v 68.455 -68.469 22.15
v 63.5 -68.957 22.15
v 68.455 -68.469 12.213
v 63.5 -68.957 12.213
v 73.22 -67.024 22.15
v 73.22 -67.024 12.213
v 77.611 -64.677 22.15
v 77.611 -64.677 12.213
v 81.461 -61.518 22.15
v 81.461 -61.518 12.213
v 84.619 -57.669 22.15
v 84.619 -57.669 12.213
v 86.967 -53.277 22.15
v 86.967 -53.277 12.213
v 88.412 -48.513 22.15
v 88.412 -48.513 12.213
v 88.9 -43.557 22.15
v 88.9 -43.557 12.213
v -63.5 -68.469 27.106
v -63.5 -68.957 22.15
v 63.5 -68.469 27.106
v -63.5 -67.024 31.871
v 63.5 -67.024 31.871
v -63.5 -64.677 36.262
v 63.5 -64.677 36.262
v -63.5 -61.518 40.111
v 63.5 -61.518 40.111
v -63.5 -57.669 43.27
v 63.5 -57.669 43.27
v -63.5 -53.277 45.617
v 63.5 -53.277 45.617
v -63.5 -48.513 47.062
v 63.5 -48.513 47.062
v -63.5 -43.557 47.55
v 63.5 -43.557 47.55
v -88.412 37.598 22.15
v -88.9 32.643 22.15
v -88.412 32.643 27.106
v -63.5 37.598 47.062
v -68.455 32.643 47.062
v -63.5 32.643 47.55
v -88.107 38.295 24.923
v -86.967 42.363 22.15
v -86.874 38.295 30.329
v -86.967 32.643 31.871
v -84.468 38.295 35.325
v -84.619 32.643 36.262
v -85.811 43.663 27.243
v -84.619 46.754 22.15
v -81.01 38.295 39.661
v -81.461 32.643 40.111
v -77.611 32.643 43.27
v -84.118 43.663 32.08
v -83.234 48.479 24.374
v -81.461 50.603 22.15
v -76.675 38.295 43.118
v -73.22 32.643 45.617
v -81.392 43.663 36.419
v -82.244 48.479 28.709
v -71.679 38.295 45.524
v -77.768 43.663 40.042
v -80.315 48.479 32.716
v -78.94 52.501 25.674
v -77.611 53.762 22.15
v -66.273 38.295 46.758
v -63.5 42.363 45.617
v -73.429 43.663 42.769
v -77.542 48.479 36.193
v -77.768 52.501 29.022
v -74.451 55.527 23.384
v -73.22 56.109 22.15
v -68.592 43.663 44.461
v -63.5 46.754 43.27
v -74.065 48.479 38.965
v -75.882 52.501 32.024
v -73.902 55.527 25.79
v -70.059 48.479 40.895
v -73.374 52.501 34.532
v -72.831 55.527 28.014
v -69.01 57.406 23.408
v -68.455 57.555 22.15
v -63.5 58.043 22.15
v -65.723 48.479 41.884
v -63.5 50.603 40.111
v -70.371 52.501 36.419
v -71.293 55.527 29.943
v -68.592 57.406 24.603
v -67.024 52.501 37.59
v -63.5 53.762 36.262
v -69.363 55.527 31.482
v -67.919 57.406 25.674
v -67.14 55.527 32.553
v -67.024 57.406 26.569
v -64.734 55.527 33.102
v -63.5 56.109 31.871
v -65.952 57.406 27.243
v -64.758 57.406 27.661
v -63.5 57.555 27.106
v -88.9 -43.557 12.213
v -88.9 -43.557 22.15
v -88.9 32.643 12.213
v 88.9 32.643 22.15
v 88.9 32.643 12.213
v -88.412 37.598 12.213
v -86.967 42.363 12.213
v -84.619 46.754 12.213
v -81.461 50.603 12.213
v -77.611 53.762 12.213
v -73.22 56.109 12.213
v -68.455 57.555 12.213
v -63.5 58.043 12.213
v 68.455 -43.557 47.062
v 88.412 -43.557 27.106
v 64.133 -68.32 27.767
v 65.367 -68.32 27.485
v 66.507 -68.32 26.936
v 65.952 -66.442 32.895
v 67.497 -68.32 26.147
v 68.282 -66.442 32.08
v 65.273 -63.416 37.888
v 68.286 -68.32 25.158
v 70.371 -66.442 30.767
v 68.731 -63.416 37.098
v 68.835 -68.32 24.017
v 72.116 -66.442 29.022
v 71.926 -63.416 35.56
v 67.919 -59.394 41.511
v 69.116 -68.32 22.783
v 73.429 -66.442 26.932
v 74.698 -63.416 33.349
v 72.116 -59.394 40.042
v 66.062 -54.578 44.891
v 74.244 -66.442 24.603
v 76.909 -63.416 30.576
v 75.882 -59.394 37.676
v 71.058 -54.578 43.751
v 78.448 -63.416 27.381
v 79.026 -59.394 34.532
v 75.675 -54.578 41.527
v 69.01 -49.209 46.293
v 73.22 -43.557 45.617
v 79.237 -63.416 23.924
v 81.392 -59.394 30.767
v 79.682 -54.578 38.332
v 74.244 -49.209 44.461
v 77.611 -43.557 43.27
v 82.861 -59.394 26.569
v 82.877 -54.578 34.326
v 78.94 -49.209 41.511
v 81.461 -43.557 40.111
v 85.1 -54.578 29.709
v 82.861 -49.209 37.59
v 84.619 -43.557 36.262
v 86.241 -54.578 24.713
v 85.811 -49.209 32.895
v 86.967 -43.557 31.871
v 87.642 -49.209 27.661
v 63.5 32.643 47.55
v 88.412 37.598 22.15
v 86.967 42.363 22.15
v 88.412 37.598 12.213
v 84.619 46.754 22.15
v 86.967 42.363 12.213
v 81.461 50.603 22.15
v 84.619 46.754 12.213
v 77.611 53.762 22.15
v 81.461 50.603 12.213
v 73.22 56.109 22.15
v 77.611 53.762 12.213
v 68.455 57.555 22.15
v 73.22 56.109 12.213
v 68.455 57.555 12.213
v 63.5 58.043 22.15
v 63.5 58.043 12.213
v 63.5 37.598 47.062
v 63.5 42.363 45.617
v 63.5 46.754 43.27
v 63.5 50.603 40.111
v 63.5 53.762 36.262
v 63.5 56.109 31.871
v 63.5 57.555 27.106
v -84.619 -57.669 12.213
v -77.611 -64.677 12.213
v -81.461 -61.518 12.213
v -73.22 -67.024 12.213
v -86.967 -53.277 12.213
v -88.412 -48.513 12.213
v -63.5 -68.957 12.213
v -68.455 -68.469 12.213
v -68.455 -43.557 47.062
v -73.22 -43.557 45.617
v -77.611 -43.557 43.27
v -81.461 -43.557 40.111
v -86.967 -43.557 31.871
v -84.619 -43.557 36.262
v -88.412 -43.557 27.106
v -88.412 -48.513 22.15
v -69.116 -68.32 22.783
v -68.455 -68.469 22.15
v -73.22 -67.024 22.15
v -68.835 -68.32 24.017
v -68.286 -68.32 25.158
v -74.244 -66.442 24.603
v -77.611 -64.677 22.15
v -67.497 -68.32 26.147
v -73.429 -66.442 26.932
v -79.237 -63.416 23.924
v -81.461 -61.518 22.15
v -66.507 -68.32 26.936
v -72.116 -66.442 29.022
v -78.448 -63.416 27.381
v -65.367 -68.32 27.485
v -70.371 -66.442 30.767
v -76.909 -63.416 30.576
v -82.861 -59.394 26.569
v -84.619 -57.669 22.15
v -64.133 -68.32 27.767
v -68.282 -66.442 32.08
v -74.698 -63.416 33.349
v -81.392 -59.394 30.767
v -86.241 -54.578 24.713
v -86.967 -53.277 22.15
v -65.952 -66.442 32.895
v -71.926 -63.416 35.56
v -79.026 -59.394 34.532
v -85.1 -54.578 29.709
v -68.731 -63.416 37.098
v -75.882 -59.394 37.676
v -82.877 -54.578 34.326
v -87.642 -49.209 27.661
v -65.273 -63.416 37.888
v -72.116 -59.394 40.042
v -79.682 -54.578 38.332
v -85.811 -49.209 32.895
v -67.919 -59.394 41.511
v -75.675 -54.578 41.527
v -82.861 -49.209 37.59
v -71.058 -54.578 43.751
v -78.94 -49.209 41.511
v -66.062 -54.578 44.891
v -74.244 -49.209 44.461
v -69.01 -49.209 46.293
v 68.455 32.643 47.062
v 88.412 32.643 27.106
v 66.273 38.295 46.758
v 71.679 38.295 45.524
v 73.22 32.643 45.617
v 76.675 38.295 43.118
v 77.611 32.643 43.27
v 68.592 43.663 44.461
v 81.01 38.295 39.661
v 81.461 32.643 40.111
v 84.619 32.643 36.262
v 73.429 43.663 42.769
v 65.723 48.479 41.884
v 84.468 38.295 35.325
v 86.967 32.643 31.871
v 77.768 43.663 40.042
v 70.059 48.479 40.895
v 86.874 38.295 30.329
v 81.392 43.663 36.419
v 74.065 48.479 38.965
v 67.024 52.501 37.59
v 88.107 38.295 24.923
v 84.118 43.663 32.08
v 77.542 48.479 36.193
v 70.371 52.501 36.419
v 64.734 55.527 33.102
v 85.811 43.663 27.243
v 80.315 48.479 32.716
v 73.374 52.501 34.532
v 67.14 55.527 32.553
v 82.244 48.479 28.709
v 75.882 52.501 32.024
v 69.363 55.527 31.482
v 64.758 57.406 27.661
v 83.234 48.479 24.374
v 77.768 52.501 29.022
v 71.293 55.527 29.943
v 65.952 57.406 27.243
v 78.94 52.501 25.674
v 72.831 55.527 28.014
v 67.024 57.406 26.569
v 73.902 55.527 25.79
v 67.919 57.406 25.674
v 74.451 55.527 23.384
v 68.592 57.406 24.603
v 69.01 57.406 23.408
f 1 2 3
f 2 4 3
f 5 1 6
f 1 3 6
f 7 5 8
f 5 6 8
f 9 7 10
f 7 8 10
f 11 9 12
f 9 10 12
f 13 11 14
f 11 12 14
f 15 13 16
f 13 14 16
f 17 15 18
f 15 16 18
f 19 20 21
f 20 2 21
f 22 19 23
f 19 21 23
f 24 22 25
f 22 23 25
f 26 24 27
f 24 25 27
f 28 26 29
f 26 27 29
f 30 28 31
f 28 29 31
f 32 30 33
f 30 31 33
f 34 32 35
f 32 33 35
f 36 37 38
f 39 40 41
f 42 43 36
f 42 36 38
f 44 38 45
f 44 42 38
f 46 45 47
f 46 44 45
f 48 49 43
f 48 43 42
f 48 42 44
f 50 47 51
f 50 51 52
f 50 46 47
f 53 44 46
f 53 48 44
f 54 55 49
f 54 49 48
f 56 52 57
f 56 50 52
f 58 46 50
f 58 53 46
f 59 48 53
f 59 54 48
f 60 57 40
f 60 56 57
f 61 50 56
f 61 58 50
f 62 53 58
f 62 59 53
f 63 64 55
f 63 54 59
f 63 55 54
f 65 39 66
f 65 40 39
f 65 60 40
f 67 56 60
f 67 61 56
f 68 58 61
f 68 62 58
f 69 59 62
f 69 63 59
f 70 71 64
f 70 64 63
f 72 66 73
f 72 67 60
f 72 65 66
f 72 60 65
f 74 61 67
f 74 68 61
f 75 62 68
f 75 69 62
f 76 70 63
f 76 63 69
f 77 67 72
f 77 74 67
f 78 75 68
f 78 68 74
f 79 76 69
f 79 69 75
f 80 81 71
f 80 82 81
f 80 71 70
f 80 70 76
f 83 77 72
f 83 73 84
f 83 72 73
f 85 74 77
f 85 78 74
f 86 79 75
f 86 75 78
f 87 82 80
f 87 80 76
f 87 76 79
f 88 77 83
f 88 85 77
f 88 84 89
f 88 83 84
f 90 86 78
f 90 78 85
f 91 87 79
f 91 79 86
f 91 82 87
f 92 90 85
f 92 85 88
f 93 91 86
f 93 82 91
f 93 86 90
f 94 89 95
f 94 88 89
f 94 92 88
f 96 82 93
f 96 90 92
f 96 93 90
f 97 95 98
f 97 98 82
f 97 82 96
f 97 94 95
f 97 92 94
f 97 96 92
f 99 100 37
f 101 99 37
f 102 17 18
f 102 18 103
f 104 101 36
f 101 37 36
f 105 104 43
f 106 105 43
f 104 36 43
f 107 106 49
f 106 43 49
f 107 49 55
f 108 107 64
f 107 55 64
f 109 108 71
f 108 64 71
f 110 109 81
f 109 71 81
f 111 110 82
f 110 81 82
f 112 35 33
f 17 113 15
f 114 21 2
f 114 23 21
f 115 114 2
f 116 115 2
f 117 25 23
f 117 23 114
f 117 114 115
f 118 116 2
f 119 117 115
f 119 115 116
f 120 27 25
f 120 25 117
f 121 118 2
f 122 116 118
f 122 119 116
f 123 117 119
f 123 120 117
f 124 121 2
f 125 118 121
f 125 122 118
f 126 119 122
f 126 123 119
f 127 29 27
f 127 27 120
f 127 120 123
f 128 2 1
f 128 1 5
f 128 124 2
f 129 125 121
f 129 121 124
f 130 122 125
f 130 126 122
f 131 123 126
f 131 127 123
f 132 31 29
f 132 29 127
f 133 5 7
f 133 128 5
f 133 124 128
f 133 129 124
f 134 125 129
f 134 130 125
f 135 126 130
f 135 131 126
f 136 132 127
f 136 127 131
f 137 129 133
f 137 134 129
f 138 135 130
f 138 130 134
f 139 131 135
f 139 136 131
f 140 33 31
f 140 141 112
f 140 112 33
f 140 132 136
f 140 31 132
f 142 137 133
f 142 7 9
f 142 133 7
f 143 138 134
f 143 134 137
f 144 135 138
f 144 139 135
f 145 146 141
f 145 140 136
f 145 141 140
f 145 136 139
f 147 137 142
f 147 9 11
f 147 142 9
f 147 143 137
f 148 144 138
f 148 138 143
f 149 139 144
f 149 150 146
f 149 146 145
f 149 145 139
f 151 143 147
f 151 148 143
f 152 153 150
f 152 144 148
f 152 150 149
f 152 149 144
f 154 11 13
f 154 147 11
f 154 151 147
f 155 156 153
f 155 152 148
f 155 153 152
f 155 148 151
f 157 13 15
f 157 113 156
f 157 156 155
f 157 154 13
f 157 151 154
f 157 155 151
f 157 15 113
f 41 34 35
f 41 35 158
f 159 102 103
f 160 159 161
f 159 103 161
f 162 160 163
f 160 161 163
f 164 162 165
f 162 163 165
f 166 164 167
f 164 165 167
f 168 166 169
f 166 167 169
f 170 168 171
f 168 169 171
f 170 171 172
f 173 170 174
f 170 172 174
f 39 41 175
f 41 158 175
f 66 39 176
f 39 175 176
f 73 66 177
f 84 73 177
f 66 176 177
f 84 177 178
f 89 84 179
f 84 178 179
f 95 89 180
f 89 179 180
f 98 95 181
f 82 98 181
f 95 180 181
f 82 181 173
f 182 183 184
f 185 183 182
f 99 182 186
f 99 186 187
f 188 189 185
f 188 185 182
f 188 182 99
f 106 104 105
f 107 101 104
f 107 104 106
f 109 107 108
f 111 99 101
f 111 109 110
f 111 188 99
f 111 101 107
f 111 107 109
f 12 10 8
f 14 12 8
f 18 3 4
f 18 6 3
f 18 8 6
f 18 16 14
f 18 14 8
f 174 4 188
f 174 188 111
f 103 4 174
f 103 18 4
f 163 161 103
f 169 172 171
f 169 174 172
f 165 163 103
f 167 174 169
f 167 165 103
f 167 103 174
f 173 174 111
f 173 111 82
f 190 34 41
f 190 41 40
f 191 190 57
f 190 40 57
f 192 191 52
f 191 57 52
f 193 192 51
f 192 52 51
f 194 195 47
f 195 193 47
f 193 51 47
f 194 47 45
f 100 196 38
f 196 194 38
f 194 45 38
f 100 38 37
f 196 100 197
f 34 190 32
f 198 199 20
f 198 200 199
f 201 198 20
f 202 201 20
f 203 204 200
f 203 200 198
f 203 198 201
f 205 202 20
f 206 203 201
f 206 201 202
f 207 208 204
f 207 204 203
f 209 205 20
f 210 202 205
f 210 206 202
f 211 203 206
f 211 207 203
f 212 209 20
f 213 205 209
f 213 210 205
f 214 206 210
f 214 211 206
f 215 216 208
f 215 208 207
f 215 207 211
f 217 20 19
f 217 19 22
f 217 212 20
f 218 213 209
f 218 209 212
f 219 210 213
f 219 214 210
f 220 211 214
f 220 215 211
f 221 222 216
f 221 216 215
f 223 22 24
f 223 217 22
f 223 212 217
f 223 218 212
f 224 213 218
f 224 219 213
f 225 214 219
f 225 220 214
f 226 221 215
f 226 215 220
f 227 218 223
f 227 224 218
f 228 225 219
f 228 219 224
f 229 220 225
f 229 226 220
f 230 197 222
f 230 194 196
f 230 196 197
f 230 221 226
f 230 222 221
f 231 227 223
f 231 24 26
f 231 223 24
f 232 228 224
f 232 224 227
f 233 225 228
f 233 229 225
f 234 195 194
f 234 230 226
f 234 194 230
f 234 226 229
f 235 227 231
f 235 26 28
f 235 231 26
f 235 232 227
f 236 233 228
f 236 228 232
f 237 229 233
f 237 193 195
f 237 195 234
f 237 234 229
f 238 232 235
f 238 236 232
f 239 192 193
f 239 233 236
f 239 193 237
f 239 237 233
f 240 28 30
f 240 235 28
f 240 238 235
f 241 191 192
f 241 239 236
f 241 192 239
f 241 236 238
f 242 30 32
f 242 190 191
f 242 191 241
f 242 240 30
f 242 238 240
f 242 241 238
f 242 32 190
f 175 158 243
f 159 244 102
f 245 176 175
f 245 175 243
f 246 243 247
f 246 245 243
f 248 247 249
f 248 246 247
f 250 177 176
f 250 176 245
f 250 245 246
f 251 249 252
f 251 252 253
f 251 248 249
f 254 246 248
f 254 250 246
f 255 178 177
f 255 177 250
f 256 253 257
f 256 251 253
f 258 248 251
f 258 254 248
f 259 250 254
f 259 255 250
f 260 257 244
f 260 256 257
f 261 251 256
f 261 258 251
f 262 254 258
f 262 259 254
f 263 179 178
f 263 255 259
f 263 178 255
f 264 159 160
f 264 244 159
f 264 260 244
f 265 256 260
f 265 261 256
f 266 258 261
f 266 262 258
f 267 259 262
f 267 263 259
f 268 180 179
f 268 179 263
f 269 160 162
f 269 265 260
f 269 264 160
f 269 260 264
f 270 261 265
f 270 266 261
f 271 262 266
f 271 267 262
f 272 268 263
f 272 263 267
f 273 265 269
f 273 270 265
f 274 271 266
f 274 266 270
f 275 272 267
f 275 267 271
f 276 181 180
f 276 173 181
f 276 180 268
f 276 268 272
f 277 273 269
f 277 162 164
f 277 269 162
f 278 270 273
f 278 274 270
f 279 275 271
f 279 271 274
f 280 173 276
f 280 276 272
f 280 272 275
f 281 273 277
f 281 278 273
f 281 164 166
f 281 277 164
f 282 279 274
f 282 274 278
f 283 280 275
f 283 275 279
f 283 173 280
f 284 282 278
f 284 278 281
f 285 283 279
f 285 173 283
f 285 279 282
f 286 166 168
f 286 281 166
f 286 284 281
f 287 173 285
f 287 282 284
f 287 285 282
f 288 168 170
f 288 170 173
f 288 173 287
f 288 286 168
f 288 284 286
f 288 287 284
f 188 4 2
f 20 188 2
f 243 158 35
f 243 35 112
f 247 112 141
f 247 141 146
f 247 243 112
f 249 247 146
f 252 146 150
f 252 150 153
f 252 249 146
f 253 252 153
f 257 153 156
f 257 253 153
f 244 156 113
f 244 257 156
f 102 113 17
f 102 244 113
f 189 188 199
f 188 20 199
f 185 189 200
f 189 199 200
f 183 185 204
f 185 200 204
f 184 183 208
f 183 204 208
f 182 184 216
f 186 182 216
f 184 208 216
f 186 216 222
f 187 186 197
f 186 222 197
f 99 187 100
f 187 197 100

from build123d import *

# Parameters (mm, degrees)
F0_W     = 127
F0_H     = 35.337034
F1_DEPTH = 88.9
F2_R     = 25.4
F3_R     = 25.4
F4_R     = 25.4
F5_R     = 25.4


with BuildPart() as f1:
    # F0 (on Right) → F1 (new body, symmetric)
    with BuildSketch(Plane.YZ):
        with Locations((-5.457316, 29.881938)):
            Rectangle(F0_W, F0_H)
    extrude(amount=F1_DEPTH, both=True)

    # F2
    f2_edges = [f1.edges().sort_by_distance(p)[0] for p in [
        (-88.9, -5.457316, 47.550455),
    ]]
    fillet(f2_edges, radius=F2_R)

    # F3
    f3_edges = [f1.edges().sort_by_distance(p)[0] for p in [
        (88.9, -5.457316, 47.550455),
    ]]
    fillet(f3_edges, radius=F3_R)

    # F4
    f4_edges = [f1.edges().sort_by_distance(p)[0] for p in [
        (-88.9, 58.042684, 17.181938),
    ]]
    fillet(f4_edges, radius=F4_R)

    # F5
    f5_edges = [f1.edges().sort_by_distance(p)[0] for p in [
        (-88.9, -68.957316, 17.181938),
    ]]
    fillet(f5_edges, radius=F5_R)


solid = f1.part
